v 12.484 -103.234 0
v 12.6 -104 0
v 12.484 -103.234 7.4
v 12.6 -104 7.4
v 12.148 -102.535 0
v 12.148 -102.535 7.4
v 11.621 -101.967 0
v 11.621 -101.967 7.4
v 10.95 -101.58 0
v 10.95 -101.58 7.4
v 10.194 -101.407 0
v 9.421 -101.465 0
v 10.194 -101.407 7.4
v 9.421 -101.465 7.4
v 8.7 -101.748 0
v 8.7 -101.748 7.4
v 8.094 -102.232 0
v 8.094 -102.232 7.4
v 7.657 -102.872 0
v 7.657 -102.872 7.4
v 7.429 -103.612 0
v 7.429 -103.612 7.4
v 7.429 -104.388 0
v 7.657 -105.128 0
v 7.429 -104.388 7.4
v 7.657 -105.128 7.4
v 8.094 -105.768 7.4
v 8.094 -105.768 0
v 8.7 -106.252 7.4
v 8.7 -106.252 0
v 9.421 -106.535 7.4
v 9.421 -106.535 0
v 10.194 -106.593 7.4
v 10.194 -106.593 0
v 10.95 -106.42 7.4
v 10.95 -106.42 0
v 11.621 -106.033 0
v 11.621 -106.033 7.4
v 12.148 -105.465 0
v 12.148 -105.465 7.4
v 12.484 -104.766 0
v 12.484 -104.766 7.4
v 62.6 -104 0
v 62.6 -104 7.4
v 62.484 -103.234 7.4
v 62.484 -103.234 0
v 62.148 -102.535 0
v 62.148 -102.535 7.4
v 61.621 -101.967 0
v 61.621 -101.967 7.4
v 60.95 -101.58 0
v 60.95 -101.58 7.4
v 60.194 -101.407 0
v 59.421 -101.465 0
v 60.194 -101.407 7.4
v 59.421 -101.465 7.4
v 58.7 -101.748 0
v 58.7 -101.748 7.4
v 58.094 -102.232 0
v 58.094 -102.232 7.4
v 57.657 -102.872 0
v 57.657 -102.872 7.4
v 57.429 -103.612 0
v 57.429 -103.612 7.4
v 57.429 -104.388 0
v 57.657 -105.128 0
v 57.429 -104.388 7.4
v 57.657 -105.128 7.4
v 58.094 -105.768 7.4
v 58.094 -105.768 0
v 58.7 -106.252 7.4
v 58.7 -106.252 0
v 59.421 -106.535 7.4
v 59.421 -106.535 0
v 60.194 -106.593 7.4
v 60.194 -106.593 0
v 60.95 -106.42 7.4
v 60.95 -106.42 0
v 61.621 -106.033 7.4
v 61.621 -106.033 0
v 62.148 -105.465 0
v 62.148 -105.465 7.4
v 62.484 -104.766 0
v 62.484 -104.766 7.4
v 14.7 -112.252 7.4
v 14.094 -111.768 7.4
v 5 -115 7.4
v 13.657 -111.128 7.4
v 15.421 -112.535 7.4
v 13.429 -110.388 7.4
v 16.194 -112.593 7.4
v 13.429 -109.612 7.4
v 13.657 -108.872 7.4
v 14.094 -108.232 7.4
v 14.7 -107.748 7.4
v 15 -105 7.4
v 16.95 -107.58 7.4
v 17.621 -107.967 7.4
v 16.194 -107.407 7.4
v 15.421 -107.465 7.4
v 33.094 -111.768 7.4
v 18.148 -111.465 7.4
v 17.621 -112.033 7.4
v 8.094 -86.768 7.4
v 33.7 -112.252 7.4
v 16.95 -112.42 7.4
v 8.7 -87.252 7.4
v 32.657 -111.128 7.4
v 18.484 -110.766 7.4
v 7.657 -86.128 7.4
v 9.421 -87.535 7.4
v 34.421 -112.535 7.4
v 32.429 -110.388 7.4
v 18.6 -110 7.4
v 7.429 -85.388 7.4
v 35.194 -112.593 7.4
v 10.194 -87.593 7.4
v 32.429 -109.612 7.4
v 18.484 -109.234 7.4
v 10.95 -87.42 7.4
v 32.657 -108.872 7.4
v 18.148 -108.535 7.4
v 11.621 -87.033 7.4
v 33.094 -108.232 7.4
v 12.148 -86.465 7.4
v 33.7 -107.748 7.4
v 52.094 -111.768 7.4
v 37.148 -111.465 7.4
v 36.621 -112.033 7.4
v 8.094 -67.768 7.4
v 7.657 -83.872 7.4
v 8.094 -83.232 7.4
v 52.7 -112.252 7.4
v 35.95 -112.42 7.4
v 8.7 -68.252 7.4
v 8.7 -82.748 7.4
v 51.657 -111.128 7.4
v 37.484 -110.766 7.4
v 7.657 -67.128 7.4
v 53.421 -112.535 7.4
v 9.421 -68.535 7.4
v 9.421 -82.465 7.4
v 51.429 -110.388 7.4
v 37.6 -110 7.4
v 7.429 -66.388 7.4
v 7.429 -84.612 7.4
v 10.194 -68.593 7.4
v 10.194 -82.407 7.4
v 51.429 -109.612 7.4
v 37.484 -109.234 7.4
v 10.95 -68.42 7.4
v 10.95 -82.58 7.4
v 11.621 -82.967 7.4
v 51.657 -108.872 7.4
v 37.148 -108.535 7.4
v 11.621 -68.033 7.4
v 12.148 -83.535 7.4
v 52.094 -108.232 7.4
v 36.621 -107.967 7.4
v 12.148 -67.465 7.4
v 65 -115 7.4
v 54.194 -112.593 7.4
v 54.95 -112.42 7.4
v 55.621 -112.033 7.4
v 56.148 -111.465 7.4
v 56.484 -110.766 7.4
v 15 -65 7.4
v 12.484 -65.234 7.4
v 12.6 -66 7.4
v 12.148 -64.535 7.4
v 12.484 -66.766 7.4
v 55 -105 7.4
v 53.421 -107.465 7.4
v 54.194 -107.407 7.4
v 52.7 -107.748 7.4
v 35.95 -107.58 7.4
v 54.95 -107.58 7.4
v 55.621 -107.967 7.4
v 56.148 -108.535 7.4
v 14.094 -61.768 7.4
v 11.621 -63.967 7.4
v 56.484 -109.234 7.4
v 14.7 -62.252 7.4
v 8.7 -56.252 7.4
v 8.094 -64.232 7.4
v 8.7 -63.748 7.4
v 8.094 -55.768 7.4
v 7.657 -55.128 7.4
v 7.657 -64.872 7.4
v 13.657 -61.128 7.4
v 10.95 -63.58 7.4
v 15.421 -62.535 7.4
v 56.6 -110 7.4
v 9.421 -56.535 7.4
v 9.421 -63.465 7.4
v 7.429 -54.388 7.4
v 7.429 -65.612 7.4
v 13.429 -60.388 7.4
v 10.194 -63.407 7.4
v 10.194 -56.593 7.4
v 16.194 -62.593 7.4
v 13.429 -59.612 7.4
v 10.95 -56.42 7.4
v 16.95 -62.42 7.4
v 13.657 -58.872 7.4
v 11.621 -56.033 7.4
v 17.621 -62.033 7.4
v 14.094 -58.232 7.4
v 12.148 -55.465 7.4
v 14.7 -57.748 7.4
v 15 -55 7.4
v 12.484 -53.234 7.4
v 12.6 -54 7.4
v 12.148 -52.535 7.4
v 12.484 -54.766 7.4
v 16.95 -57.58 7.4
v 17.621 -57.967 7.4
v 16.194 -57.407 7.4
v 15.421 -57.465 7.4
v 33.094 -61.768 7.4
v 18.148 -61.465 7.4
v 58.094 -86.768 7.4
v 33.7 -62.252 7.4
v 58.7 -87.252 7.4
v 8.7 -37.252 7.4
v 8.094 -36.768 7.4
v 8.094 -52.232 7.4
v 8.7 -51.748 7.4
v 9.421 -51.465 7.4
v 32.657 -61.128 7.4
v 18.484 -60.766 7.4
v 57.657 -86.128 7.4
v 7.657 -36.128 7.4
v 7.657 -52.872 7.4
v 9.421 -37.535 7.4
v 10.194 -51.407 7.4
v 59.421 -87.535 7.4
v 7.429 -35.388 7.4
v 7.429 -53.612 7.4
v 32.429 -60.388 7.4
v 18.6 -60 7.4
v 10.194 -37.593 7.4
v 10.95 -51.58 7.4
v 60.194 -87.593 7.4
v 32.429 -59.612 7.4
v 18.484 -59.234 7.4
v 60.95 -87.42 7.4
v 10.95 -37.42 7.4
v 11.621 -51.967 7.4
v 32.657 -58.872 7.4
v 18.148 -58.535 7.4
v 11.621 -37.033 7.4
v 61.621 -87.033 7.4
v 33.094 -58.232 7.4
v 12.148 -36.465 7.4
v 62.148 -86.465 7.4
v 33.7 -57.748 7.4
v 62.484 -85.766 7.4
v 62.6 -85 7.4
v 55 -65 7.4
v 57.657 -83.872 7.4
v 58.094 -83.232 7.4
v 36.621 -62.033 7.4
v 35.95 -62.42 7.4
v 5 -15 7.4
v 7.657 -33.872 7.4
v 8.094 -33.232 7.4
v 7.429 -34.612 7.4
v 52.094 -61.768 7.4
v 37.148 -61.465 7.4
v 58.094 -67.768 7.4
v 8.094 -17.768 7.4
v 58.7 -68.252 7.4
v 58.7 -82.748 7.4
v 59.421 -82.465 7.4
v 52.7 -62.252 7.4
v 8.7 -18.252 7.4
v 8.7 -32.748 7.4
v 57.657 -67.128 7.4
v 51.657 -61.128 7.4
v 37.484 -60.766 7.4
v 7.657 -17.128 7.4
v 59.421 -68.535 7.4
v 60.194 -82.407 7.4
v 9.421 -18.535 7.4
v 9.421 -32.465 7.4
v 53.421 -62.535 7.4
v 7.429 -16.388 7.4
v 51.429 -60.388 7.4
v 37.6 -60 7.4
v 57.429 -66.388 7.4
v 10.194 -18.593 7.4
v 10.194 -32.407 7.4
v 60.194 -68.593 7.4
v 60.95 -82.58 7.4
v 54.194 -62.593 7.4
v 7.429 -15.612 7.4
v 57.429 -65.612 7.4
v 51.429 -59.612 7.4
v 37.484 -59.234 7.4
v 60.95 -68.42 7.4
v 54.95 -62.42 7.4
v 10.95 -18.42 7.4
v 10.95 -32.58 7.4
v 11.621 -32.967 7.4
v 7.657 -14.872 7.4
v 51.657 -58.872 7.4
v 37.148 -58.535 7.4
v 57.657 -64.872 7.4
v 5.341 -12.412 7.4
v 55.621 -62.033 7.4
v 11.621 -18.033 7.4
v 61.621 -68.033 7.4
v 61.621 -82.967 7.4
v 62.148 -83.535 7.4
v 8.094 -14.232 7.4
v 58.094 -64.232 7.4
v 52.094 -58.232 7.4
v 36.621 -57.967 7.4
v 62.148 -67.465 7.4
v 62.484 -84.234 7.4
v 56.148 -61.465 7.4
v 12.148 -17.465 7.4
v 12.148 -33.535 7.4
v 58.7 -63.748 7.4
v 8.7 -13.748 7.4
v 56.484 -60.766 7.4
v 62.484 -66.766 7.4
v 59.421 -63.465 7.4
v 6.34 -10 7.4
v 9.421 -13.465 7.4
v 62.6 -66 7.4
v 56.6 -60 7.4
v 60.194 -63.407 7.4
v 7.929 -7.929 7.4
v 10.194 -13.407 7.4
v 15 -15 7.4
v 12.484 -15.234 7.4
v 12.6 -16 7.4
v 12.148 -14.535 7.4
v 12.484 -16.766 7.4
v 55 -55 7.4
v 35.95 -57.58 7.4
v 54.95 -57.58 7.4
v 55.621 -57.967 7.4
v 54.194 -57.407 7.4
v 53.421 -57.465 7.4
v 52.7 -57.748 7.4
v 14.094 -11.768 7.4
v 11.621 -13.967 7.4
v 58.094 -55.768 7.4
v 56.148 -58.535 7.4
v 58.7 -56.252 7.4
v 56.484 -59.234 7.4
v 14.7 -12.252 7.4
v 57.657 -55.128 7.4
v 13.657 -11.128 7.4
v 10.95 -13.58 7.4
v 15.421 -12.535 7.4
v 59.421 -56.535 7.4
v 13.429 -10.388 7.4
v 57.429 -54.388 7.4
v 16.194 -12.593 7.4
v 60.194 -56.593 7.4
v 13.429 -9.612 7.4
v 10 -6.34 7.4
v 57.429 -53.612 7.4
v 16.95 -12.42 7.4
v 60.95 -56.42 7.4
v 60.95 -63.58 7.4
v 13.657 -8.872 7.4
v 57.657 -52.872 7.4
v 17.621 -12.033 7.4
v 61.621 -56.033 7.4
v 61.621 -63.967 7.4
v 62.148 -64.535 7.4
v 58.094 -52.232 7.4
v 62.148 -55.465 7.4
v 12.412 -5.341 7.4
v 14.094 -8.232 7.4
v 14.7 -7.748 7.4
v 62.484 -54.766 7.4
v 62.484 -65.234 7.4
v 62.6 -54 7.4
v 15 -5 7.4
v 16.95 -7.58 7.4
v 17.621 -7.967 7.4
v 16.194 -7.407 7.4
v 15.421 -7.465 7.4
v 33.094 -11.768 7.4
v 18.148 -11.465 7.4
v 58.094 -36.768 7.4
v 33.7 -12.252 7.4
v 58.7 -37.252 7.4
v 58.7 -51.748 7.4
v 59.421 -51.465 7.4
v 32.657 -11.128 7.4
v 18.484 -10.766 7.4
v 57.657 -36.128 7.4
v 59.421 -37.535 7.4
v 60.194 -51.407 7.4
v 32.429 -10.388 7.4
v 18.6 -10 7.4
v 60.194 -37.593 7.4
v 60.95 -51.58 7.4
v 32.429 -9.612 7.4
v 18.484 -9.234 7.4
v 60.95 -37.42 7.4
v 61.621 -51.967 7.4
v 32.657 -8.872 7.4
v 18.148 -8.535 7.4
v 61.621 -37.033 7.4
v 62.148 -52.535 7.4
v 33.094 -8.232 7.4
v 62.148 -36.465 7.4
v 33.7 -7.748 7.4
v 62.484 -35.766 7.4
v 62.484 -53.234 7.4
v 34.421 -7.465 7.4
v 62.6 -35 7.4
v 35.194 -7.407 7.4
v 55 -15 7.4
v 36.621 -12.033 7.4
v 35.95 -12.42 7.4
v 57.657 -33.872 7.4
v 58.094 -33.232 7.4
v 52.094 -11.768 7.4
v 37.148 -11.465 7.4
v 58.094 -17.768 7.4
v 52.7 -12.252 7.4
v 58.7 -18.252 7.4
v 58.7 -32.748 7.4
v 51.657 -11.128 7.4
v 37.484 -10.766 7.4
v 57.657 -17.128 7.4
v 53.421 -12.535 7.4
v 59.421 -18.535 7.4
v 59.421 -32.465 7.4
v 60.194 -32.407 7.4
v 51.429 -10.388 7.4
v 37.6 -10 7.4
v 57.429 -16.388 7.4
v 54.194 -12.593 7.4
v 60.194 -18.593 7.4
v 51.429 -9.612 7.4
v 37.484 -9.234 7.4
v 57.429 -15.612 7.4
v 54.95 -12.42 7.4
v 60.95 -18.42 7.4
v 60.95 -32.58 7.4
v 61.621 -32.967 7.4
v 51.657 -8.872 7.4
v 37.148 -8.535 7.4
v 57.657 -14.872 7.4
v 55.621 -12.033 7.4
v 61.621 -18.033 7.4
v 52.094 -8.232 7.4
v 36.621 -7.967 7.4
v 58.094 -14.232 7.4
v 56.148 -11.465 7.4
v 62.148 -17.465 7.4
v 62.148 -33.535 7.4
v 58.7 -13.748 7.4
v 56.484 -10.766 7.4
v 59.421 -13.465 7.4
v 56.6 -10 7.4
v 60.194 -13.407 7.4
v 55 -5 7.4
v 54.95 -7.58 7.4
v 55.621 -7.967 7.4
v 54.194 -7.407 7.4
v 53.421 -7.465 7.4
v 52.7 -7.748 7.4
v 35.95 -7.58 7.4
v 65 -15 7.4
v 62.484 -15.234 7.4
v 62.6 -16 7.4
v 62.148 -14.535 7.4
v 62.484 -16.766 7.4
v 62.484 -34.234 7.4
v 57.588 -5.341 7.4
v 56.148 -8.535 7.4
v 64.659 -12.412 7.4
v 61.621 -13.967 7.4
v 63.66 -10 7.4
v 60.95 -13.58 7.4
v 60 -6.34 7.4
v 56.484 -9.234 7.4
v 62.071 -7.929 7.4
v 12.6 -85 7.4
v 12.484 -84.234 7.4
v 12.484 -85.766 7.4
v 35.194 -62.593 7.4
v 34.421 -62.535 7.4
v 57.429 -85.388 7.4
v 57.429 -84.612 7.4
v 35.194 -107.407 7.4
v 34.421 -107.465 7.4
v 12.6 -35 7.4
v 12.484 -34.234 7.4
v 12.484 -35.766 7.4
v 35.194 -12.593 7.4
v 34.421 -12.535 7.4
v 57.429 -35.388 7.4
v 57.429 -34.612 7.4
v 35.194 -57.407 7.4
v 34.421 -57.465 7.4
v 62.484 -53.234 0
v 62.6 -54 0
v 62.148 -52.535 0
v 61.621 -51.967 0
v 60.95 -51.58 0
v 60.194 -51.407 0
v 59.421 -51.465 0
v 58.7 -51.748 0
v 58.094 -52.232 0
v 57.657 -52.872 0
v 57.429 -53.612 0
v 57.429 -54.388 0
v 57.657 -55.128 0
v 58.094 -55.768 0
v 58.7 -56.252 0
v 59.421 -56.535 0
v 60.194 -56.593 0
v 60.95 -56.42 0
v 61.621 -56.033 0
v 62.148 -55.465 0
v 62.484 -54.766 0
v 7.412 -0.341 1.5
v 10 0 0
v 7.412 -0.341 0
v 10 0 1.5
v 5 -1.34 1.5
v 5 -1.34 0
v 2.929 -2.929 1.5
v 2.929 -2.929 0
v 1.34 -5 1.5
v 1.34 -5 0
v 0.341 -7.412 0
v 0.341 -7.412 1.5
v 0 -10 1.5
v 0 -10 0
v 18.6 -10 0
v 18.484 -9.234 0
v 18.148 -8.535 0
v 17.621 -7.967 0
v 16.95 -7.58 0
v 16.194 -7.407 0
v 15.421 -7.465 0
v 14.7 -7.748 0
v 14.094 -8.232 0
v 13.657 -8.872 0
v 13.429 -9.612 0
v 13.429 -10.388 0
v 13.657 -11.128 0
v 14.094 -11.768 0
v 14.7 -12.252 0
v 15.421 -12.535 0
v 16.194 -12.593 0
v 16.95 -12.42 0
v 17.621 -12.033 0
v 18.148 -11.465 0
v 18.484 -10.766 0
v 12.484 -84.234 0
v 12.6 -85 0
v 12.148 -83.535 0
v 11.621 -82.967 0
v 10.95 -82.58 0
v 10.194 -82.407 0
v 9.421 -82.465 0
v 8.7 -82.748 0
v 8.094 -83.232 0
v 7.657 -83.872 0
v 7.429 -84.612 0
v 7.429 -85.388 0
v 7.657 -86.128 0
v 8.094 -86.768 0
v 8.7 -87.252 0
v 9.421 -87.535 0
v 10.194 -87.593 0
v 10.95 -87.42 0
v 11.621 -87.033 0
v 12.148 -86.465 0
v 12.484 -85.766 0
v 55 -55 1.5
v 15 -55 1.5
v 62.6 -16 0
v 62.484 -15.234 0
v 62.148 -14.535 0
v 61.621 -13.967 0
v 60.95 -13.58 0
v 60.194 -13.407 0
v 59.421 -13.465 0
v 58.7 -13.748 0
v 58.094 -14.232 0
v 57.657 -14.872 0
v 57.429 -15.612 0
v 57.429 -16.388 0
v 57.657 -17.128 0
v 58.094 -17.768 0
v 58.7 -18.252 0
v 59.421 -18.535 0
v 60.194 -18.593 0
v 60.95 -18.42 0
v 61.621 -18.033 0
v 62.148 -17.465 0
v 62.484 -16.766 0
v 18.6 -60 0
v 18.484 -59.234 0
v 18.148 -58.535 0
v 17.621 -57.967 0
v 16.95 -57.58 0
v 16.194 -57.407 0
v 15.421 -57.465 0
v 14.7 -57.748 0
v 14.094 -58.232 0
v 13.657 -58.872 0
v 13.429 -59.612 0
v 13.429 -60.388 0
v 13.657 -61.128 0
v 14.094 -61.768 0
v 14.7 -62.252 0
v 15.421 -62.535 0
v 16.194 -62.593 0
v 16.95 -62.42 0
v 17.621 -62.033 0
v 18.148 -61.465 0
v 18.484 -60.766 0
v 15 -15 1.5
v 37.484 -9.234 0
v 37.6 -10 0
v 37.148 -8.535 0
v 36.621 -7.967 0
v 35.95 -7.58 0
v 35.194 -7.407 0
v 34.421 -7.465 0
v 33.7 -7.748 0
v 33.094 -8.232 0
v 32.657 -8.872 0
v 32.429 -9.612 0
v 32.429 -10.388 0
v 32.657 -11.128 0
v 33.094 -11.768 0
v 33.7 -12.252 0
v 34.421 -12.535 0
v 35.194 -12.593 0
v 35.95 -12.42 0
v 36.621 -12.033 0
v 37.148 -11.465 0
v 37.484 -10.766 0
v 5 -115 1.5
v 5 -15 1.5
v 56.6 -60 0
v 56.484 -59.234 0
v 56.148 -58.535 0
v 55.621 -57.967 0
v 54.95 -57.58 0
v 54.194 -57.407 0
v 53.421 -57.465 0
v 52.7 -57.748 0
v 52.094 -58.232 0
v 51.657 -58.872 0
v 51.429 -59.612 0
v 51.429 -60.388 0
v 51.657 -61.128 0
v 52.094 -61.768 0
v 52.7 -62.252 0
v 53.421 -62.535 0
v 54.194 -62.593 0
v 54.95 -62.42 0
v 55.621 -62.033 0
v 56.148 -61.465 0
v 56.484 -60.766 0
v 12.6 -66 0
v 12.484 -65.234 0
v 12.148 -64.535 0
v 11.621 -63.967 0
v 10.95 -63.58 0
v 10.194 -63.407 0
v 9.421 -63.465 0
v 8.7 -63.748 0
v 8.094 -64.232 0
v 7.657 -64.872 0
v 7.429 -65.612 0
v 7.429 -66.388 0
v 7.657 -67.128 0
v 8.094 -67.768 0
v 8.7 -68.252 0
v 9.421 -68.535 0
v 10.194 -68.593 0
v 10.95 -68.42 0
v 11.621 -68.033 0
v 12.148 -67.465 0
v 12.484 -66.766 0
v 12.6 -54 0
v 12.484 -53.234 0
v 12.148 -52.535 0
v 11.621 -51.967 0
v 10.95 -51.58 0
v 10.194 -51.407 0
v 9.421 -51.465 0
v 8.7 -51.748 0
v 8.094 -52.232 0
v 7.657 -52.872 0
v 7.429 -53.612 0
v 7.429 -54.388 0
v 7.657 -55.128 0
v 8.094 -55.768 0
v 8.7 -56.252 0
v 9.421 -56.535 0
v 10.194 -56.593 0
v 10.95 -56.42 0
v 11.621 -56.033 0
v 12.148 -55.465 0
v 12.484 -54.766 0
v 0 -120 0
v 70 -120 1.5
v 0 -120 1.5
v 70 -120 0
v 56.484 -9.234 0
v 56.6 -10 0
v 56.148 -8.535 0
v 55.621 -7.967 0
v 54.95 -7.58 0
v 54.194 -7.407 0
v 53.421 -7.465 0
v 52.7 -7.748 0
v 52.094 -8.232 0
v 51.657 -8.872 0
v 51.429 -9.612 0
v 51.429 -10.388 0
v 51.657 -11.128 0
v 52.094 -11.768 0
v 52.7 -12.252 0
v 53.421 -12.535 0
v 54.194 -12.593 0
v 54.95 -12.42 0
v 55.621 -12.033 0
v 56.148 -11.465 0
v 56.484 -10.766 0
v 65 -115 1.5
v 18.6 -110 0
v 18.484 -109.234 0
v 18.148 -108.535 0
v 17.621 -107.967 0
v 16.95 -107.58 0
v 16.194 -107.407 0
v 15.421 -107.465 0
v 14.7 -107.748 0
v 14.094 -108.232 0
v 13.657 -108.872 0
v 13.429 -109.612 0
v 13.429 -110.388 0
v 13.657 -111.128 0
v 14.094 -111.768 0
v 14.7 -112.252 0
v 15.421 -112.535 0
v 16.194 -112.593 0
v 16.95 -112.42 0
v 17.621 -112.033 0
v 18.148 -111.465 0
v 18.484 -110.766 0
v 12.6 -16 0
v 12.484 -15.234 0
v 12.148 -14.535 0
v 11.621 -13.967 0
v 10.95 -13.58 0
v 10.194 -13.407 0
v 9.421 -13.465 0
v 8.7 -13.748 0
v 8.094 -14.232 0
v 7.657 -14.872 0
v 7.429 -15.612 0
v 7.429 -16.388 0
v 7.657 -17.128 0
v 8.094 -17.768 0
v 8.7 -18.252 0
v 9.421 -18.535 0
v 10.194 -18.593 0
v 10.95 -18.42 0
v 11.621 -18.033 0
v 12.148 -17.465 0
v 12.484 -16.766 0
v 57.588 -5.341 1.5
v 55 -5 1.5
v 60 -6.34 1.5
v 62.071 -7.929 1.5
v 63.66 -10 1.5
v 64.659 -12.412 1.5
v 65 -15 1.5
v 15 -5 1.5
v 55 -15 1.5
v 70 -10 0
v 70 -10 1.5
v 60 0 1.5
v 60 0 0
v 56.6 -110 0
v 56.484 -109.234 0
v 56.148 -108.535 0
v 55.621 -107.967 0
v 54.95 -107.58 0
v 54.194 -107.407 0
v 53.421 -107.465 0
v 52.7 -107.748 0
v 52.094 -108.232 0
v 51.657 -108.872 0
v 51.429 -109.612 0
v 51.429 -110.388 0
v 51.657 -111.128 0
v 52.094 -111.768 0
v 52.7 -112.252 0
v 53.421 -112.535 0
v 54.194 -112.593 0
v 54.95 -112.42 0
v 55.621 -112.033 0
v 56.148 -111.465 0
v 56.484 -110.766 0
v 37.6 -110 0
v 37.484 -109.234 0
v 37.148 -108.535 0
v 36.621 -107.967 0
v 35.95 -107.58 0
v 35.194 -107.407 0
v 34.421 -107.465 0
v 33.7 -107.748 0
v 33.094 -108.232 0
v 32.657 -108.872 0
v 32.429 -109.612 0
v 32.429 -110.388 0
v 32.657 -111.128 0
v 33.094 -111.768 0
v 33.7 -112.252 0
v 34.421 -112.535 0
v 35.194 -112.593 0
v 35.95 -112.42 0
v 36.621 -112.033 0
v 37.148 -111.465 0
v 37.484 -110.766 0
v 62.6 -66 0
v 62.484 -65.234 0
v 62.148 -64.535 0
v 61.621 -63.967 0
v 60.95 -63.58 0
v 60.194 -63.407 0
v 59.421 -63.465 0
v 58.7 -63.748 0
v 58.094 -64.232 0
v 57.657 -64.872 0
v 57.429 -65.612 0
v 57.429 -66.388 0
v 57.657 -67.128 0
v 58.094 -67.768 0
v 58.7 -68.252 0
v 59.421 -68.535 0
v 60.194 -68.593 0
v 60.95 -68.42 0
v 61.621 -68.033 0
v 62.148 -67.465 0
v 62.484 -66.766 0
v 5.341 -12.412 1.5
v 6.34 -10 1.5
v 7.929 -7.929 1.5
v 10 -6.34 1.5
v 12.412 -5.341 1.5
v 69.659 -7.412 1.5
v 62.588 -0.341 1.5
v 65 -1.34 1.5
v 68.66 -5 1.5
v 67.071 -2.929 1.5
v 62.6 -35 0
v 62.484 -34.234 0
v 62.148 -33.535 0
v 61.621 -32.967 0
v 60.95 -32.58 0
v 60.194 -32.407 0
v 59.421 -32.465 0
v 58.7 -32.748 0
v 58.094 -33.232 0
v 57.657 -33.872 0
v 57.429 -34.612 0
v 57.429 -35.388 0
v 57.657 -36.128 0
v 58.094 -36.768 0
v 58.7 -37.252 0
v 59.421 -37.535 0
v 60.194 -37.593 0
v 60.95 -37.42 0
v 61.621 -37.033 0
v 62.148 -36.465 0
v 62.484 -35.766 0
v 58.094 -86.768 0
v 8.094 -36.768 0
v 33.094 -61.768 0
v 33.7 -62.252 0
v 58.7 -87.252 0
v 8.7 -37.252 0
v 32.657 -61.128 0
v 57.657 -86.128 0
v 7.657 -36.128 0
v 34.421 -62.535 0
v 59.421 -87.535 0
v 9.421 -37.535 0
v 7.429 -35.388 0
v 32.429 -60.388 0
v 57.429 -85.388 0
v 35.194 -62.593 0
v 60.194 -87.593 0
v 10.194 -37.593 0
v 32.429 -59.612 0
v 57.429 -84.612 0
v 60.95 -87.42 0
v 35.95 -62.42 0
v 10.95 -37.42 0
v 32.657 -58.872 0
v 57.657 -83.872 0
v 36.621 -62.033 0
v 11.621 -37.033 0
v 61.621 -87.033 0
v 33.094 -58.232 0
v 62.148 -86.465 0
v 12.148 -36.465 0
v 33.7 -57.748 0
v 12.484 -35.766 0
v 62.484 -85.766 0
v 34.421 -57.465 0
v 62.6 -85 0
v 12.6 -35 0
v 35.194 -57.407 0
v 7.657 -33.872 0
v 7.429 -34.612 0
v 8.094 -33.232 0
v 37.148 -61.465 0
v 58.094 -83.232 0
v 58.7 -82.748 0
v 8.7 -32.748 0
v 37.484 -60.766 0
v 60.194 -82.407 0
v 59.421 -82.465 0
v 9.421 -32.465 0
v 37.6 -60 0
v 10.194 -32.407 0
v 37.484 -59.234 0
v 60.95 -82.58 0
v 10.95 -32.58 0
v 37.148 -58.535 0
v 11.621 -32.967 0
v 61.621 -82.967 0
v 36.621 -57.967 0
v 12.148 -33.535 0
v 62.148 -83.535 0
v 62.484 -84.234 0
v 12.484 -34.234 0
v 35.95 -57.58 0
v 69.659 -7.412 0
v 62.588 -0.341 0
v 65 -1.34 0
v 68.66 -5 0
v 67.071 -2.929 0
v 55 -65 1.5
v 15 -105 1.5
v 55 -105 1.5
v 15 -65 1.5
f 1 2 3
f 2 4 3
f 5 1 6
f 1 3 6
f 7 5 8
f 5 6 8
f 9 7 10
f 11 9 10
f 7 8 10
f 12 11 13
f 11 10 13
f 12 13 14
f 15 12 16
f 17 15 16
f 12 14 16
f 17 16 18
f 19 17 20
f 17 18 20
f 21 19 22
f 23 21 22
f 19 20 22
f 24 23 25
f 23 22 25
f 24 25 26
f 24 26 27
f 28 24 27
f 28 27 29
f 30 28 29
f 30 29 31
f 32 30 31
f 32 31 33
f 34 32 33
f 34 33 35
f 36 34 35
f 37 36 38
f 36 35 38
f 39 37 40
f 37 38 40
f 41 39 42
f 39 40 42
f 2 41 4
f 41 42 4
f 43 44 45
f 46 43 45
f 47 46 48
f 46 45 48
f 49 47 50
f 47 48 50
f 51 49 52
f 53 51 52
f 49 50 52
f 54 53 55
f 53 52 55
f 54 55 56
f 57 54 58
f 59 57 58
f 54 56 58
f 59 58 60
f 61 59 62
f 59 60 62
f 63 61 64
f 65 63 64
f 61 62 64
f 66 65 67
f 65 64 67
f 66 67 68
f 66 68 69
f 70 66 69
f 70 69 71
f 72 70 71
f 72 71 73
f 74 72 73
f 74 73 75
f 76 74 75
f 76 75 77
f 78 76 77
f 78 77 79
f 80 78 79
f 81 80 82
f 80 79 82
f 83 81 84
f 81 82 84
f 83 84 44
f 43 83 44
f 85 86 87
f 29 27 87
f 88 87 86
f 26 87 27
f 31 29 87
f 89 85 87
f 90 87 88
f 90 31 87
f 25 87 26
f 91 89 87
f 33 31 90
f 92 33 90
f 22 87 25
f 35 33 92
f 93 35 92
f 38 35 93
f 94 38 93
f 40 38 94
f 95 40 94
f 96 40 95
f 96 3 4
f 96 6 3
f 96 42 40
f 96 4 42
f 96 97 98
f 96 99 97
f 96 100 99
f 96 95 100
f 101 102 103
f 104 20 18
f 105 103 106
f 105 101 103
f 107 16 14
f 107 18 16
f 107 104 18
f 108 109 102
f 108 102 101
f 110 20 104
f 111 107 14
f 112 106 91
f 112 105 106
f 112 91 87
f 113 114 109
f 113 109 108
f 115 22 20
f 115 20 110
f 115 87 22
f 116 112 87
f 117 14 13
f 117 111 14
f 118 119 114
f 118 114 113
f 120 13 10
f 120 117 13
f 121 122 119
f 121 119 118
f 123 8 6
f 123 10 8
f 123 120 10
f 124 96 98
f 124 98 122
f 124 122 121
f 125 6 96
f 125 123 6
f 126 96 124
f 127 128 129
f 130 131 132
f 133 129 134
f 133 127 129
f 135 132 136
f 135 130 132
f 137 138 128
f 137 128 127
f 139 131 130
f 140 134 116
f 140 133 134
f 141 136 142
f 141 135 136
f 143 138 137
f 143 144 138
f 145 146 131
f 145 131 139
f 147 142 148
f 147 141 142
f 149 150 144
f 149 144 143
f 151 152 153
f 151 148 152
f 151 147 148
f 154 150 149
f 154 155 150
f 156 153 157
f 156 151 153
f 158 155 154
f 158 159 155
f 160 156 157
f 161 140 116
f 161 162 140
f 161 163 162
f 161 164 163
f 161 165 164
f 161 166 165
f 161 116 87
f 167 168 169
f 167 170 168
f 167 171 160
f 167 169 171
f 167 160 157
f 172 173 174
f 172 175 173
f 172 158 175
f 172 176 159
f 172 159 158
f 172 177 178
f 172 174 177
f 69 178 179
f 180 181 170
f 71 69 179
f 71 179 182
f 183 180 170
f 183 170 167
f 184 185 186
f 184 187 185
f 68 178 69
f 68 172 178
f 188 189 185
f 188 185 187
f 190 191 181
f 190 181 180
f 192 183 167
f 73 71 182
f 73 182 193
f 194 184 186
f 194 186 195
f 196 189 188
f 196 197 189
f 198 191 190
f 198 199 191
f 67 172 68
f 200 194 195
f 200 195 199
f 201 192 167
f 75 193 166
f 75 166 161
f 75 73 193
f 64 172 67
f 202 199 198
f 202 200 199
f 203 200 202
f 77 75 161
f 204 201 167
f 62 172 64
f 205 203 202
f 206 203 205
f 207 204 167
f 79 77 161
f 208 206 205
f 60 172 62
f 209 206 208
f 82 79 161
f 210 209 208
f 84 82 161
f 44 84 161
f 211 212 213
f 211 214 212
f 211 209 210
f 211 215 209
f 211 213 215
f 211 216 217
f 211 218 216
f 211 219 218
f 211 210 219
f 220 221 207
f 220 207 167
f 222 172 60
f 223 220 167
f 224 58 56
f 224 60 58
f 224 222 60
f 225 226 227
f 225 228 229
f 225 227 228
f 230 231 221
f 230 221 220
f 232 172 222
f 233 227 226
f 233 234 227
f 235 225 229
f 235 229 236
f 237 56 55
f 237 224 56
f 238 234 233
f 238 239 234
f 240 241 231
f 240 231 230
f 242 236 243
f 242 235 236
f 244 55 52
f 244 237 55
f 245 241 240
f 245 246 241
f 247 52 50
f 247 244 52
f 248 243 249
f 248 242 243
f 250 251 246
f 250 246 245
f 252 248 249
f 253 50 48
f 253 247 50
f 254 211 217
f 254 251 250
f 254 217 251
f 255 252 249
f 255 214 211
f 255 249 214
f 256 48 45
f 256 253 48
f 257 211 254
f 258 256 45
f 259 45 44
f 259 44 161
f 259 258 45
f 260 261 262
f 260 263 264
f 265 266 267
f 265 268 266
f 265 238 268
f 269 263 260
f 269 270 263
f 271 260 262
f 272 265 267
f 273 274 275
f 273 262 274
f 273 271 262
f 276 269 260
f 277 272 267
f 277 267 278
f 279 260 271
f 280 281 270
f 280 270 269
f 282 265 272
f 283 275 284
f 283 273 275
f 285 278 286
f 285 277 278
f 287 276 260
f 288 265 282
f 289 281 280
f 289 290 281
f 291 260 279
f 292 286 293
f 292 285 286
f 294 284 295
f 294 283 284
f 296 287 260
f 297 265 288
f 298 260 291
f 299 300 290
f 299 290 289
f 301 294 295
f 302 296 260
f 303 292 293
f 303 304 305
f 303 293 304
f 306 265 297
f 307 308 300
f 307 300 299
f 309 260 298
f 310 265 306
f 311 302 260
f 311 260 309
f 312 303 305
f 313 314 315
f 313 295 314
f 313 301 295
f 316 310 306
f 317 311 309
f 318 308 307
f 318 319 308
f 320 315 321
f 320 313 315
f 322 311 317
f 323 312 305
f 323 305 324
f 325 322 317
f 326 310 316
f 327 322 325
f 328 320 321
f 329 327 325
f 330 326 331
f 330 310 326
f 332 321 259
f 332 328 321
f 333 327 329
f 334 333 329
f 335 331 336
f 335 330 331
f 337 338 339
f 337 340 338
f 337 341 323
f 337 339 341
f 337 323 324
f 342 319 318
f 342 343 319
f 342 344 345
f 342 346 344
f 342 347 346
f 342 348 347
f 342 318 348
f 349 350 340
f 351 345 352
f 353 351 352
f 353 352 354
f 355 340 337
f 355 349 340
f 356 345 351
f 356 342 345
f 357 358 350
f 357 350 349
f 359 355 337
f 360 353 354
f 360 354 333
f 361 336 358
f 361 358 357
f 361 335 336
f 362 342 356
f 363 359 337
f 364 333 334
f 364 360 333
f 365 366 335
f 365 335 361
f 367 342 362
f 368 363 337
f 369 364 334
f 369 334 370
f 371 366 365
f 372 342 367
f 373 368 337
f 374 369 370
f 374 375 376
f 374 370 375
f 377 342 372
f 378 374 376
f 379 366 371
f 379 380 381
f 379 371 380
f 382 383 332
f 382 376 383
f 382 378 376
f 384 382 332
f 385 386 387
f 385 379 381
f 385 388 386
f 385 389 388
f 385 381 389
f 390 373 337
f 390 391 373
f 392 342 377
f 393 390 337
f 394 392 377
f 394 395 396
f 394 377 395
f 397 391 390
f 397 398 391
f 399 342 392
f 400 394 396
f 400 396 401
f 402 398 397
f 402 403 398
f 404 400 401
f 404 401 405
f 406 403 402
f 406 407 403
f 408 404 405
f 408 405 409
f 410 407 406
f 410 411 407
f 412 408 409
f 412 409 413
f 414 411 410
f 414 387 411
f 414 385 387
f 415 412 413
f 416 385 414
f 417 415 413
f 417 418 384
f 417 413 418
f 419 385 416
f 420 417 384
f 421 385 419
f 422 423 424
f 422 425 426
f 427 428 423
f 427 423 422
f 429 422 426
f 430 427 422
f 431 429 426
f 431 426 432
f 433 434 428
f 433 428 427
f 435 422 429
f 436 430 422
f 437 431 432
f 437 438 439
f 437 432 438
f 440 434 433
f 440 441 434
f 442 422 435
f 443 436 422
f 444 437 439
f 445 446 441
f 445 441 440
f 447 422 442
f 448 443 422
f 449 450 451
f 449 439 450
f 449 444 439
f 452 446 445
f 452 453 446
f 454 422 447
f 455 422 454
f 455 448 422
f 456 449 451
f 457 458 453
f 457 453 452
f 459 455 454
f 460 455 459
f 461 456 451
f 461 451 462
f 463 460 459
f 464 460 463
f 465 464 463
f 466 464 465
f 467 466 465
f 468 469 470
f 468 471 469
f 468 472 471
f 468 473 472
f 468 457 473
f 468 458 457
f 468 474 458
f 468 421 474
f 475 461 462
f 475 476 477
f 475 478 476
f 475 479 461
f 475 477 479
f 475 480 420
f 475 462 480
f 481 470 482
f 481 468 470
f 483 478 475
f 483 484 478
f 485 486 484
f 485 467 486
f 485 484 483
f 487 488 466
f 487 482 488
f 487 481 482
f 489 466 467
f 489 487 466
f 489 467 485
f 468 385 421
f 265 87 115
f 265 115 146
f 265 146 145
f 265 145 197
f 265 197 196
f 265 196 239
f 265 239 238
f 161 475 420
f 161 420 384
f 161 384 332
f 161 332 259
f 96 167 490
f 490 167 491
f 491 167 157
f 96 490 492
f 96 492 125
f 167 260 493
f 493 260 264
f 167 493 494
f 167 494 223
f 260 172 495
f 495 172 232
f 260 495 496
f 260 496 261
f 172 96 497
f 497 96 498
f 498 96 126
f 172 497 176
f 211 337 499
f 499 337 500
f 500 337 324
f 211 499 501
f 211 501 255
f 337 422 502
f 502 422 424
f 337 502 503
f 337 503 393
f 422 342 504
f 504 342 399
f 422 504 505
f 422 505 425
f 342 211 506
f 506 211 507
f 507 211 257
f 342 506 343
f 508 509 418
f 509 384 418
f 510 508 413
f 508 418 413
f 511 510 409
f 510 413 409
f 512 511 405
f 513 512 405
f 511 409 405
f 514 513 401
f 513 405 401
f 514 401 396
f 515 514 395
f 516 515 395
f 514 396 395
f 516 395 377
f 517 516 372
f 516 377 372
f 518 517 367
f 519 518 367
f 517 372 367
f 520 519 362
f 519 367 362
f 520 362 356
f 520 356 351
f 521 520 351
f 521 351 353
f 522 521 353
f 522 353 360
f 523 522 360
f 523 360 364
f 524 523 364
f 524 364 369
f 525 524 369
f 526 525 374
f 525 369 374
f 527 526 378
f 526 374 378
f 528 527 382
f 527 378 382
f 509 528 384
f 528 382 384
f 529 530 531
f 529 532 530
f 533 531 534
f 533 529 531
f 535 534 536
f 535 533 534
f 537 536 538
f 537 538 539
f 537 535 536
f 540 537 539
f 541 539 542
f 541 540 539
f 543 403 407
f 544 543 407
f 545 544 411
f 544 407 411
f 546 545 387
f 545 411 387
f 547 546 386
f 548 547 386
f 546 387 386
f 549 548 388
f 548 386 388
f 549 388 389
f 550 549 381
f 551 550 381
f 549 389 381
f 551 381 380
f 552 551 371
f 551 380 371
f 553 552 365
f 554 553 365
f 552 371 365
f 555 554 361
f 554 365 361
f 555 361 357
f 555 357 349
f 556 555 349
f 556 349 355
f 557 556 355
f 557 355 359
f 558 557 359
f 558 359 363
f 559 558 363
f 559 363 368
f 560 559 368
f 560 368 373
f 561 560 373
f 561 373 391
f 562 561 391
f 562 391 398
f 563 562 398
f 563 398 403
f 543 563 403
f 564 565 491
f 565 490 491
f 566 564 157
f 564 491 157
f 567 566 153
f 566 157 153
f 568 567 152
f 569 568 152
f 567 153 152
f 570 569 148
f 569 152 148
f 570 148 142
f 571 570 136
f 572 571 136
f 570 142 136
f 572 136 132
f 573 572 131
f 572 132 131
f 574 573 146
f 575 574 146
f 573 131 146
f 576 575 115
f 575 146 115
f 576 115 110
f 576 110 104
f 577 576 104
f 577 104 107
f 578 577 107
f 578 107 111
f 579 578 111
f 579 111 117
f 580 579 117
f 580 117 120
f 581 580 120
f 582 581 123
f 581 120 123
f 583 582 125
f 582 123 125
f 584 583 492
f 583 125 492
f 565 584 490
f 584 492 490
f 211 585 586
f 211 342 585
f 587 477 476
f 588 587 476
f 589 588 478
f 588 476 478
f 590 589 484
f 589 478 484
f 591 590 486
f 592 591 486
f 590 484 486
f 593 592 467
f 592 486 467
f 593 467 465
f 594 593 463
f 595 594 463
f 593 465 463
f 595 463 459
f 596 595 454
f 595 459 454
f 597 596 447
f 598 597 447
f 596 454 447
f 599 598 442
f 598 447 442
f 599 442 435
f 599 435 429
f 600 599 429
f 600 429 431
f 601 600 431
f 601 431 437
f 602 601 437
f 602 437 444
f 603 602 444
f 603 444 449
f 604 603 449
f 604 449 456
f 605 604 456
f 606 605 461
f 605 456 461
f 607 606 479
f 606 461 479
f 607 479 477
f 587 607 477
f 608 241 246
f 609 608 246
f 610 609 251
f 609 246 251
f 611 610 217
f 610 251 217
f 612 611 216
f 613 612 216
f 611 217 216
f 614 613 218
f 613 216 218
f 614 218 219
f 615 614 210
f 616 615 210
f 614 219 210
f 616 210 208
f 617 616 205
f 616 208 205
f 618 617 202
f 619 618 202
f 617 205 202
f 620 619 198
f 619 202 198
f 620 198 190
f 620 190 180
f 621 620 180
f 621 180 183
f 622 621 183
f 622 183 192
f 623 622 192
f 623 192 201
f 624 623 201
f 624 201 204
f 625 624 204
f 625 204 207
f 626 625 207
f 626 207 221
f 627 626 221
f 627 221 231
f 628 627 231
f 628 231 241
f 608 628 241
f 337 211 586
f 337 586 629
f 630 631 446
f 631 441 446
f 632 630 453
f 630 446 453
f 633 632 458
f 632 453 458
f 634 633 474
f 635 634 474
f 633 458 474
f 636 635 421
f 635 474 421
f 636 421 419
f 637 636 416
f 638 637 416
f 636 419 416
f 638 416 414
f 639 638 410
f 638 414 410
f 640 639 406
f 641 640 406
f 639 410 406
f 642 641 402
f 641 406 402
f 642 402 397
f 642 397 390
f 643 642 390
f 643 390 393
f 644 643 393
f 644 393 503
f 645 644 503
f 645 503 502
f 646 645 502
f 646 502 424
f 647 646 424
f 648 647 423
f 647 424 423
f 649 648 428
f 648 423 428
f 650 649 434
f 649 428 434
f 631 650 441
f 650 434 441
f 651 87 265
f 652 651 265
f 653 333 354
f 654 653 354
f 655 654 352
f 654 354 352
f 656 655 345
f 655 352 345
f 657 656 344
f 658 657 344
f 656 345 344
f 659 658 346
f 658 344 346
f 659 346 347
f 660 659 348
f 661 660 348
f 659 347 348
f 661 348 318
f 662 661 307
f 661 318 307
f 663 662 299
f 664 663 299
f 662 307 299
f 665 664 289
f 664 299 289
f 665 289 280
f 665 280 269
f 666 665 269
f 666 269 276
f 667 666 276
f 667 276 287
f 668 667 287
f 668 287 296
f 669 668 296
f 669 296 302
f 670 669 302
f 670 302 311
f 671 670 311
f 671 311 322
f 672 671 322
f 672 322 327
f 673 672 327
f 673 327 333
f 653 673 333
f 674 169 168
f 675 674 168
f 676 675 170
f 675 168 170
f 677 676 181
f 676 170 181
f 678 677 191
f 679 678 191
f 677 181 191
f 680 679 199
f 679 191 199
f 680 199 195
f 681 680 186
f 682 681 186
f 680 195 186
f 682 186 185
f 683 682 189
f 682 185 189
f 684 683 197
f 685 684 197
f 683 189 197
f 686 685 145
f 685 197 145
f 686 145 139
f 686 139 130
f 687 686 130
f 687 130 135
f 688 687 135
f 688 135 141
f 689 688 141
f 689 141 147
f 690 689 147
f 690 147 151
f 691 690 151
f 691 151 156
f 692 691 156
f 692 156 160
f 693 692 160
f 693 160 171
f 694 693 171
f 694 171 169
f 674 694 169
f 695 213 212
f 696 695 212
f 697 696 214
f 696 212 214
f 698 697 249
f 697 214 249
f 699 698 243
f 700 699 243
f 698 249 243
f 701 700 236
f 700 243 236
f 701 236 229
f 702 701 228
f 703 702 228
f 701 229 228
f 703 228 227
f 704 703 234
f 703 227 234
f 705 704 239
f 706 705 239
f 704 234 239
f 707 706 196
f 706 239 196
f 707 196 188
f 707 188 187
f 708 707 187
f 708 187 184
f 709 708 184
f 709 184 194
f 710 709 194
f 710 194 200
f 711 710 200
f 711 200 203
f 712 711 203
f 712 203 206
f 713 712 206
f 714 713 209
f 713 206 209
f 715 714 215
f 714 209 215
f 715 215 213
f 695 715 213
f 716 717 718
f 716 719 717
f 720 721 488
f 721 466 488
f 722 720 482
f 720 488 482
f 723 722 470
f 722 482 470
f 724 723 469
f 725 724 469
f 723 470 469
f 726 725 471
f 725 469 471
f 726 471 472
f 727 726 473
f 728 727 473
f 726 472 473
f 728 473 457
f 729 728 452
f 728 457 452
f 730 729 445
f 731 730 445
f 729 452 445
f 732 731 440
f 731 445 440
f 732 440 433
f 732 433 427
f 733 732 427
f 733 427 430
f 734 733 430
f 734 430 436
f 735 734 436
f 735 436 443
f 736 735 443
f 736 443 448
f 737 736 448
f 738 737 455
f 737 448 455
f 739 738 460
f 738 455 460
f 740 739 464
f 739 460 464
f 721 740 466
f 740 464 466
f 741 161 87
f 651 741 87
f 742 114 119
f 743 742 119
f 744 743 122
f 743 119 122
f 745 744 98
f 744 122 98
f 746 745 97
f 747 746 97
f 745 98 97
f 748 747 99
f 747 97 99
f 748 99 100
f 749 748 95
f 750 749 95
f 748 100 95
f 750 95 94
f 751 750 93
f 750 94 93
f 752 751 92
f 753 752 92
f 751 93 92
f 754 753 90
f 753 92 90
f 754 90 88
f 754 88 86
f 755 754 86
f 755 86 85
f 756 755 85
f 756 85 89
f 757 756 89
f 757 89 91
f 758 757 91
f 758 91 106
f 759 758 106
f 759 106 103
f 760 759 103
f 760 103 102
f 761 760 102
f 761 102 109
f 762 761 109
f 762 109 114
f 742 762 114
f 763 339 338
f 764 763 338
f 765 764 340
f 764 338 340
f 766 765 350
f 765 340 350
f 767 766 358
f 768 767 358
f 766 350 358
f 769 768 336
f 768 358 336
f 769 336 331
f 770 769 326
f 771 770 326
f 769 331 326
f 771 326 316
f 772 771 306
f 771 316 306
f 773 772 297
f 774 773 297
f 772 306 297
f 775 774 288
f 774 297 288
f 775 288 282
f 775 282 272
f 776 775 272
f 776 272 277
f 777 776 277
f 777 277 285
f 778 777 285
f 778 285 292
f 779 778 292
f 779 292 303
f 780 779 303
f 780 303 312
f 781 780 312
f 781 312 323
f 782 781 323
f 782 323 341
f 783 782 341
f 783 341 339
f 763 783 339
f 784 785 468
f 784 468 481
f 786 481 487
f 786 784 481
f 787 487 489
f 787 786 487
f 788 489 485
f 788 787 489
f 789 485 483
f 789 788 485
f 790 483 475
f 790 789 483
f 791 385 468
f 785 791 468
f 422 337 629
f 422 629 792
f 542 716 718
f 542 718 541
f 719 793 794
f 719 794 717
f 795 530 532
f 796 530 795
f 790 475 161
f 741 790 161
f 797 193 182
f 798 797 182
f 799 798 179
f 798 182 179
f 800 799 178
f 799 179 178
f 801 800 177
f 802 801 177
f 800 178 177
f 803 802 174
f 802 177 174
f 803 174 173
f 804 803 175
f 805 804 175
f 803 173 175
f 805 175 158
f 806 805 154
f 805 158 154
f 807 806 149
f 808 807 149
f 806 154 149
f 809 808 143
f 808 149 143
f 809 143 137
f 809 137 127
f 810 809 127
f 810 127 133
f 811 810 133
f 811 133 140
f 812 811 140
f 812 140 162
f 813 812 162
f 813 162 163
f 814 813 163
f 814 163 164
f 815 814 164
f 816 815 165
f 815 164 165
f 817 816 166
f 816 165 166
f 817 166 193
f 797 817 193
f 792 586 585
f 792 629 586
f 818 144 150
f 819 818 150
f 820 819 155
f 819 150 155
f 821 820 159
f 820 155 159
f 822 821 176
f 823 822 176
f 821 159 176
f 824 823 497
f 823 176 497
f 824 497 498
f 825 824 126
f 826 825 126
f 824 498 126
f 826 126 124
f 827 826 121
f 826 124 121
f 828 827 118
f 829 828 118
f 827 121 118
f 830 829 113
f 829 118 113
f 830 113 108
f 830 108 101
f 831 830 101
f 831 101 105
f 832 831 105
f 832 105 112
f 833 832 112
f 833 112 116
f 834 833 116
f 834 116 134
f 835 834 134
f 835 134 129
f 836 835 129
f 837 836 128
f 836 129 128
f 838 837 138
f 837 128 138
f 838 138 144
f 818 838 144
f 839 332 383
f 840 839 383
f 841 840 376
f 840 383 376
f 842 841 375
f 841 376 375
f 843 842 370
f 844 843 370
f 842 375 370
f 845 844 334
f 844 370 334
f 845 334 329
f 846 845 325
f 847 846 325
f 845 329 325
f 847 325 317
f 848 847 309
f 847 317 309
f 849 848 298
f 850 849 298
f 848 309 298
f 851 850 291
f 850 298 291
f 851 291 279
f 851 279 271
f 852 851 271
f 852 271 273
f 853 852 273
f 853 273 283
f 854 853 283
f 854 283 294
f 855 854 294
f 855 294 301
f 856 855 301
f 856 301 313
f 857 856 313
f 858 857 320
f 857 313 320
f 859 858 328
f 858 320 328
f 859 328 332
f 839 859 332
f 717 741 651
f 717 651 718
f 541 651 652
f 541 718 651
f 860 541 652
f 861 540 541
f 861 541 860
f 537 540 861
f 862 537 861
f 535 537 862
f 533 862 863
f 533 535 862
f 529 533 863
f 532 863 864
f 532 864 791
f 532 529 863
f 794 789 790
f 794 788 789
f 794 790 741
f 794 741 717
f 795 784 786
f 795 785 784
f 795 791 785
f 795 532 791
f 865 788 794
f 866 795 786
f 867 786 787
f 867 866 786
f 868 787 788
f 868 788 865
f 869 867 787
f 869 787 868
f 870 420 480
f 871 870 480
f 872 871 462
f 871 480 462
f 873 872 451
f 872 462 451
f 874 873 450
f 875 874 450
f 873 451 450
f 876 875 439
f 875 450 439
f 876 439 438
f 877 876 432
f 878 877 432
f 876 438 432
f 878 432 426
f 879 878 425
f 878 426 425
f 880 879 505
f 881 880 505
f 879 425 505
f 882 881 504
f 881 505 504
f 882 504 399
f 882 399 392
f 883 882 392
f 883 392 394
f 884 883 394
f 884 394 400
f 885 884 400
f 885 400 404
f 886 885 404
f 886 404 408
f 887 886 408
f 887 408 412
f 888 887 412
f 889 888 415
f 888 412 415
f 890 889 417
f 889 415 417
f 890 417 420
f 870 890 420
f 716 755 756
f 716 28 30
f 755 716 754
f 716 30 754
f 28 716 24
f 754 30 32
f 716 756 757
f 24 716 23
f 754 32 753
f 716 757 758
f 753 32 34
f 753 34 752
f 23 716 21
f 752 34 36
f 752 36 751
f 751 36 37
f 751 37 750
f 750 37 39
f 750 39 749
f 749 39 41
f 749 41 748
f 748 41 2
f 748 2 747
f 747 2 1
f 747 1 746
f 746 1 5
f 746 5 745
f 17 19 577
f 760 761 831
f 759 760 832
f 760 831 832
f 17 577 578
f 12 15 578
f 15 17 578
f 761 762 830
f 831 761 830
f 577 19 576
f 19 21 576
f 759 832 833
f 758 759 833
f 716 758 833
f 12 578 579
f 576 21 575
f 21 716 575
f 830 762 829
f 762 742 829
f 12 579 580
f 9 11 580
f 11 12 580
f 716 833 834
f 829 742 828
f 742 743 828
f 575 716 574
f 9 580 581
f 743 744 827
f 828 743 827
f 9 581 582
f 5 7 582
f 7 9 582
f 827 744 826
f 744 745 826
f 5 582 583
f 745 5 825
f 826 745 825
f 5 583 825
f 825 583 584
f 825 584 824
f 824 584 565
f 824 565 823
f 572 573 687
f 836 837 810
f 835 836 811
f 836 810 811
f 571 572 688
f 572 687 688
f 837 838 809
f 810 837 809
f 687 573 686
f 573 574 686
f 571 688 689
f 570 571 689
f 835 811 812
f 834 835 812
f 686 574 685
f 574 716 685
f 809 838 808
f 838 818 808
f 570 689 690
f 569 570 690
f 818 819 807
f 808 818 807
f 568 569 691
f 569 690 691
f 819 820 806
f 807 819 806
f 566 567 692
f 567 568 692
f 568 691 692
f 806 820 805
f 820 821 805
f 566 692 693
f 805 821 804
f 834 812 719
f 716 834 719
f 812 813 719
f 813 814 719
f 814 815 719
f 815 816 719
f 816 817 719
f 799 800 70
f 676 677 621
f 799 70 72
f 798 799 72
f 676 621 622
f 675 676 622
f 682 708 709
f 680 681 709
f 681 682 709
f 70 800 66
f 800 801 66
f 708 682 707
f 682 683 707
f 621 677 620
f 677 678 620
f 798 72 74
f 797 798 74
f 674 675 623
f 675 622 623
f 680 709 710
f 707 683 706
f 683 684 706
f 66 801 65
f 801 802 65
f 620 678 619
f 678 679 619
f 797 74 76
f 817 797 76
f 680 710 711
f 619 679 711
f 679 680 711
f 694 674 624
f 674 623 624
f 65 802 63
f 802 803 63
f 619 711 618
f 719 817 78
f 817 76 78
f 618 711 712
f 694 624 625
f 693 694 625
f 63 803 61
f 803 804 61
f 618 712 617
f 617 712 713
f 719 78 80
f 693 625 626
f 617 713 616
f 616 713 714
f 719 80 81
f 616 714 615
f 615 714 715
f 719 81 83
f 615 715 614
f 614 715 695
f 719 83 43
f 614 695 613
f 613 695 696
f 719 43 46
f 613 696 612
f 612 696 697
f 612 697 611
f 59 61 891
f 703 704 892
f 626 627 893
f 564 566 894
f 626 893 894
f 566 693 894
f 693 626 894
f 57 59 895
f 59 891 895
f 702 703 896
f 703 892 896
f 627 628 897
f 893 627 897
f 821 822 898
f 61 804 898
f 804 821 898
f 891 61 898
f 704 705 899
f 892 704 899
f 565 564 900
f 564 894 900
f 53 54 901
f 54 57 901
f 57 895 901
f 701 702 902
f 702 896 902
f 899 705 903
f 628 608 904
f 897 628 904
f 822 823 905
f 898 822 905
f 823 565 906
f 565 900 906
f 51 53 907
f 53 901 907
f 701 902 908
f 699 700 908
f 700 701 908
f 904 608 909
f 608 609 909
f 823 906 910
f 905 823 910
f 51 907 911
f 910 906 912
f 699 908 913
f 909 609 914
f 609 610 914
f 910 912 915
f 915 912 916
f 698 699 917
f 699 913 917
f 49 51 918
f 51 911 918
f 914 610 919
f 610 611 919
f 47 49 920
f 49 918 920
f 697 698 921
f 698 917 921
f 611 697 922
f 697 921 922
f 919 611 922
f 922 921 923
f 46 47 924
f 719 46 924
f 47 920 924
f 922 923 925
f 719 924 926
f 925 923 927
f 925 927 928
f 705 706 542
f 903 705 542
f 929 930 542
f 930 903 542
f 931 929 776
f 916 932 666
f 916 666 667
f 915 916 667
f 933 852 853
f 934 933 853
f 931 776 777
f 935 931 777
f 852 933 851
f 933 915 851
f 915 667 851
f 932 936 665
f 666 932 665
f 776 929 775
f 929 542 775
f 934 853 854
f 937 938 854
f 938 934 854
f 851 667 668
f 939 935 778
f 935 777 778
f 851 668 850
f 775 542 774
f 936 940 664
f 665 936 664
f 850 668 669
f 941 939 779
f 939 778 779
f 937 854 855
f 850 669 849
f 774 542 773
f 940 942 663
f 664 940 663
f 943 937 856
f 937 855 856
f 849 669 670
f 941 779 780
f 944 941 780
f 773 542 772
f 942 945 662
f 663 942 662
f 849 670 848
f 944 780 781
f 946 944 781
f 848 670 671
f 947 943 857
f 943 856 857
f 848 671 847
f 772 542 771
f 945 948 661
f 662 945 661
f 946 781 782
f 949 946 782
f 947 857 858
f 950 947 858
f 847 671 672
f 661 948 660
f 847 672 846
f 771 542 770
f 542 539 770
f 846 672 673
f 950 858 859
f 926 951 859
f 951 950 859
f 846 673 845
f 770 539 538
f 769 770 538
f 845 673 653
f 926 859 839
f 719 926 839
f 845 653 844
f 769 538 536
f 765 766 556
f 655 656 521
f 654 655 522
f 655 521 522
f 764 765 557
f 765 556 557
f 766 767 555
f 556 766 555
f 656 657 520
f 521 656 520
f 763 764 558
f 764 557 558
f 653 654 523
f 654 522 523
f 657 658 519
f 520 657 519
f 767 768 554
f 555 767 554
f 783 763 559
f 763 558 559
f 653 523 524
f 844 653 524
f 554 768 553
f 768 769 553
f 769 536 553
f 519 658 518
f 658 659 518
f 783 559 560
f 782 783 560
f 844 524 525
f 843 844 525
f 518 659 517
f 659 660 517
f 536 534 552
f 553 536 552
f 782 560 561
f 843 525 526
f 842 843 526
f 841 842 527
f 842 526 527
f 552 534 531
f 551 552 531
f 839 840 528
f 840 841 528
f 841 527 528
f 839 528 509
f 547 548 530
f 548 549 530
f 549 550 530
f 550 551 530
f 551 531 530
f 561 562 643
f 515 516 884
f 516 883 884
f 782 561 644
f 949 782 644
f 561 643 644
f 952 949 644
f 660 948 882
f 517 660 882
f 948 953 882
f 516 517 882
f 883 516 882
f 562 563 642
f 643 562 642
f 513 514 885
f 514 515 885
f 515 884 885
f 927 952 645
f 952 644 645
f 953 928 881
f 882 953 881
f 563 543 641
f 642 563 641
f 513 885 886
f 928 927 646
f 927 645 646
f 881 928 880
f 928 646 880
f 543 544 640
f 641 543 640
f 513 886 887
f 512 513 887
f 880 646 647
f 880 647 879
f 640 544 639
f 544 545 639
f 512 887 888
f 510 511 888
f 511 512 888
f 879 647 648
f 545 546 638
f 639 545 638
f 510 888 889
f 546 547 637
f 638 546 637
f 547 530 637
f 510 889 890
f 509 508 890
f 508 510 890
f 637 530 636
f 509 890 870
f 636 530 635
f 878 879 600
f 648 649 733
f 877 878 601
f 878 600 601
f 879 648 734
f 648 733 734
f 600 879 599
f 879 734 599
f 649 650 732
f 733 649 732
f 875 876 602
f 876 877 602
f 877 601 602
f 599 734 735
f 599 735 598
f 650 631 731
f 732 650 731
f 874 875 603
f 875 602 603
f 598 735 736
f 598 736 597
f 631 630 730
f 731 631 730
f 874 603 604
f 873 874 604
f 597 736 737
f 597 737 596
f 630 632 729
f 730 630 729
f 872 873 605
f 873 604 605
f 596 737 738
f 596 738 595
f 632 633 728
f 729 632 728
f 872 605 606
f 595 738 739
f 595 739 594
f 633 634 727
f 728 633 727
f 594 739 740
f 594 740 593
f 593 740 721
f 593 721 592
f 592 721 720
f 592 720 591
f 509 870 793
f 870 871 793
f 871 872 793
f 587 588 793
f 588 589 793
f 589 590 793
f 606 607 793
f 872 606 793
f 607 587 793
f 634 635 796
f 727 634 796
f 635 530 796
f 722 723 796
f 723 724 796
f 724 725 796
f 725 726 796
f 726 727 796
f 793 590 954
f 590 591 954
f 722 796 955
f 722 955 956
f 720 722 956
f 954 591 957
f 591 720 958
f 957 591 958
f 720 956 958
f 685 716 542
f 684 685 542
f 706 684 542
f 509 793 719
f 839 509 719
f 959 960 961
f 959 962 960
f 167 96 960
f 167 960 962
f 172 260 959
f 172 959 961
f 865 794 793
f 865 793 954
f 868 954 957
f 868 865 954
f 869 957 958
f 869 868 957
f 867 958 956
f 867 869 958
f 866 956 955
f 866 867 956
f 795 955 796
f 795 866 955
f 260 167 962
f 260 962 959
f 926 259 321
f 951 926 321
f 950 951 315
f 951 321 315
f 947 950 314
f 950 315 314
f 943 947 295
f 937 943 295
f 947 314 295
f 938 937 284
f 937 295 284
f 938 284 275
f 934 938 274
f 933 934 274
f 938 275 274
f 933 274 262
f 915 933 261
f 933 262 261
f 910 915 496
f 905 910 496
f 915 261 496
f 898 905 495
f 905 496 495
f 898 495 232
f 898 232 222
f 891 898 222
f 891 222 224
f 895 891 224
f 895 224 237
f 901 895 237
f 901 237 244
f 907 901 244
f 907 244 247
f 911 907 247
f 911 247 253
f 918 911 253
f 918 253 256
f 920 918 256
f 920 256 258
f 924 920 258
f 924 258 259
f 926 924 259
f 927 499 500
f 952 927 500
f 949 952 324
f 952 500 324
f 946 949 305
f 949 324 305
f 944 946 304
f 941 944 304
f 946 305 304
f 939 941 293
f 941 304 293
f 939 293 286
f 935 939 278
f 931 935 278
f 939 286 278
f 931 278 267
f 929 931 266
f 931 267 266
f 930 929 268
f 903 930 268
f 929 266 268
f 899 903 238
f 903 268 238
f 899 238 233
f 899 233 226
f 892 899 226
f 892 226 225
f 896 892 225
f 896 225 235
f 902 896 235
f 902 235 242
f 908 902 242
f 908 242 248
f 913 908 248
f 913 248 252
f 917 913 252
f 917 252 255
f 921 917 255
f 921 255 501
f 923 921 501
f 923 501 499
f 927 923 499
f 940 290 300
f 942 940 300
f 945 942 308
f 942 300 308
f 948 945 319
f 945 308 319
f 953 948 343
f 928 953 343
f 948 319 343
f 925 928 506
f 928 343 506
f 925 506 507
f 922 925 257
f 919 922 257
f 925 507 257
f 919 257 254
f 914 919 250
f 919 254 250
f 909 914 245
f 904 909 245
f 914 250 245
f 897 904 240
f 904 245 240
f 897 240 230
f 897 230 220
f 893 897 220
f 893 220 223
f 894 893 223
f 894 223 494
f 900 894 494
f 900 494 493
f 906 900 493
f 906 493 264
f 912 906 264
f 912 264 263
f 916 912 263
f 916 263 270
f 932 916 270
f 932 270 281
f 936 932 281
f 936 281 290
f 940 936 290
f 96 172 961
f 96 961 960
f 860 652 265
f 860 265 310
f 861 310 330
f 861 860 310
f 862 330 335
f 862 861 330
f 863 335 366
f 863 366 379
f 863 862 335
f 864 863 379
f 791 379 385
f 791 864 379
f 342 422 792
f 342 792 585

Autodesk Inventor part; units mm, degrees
ref_plane "YZ Plane" through (0, 0, 0) normal (1, 0, 0) x (0, 1, 0)
ref_plane "XZ Plane" through (0, 0, 0) normal (0, 1, 0) x (-1, 0, 0)
ref_plane "XY Plane" through (0, 0, 0) normal (0, 0, 1) x (1, 0, 0)
sketch "Sketch1" plane through (0, 0, 0) normal (0, 0, 1) x (1, 0, 0)
  line L0 (0, 0) -> (70, 0)
  line L1 (70, 0) -> (70, -120)
  line L2 (70, -120) -> (0, -120)
  line L3 (0, -120) -> (0, 0)
  dimension "d0" = 70
  dimension "d1" = 120
extrude "Extrusion1" add sketch "Sketch1" along normal blind 7.4
sketch "Sketch2" plane through (0, 0, 7.4) normal (0, 0, 1) x (1, 0, 0)
  circle A0 centre (10, -104) radius 2.6
  circle A1 centre (16, -110) radius 2.6
  circle A2 centre (35, -110) radius 2.6
  circle A3 centre (10, -66) radius 2.6
  circle A4 centre (16, -60) radius 2.6
  circle A5 centre (10, -35) radius 2.6
  circle A6 centre (10, -16) radius 2.6
  circle A7 centre (16, -10) radius 2.6
  circle A8 centre (35, -60) radius 2.6
  circle A9 centre (60, -104) radius 2.6
  circle A10 centre (60, -66) radius 2.6
  circle A11 centre (10, -85) radius 2.6
  circle A12 centre (60, -85) radius 2.6
  circle A13 centre (54, -110) radius 2.6
  circle A14 centre (54, -60) radius 2.6
  circle A15 centre (60, -54) radius 2.6
  circle A16 centre (60, -16) radius 2.6
  circle A17 centre (10, -54) radius 2.6
  circle A18 centre (35, -10) radius 2.6
  circle A19 centre (54, -10) radius 2.6
  line L0 (0, 0) -> (0, -120) projected
  line L1 (70, -120) -> (70, 0) projected
  line L2 (70, 0) -> (0, 0) projected
  line L3 (0, -120) -> (70, -120) projected
  circle A20 centre (60, -35) radius 2.6
  dimension "d5" = 5.2
  dimension "d6" = 5.2
  dimension "d7" = 5.2
  dimension "d10" = 5.2
  dimension "d11" = 5.2
  dimension "d12" = 5.2
  dimension "d15" = 5.2
  dimension "d16" = 5.2
  dimension "d17" = 5.2
  dimension "d19" = 5.2
  dimension "d20" = 5.2
  dimension "d21" = 5.2
  dimension "d22" = 5.2
  dimension "d23" = 5.2
  dimension "d24" = 5.2
  dimension "d25" = 5.2
  dimension "d26" = 5.2
  dimension "d27" = 5.2
  dimension "d54" = 10
  dimension "d55" = 10
  dimension "d56" = 16
  dimension "d57" = 16
  dimension "d58" = 16
  dimension "d59" = 35
  dimension "d60" = 10
  dimension "d61" = 19
  dimension "d62" = 19
  dimension "d63" = 19
  dimension "d64" = 5.2
  dimension "d67" = 6
  dimension "d68" = 6
  dimension "d69" = 6
  dimension "d70" = 6
  dimension "d71" = 19
  dimension "d72" = 19
  dimension "d74" = 6
  dimension "d75" = 10
extrude "Extrusion2" cut sketch "Sketch2" against normal through all contours A0 | A1 | A2 | A3 | A4 | A5 | A6 | A7 | A8 | A9 | A10 | A11 | A12 | A13 | A14 | A15 | A16 | A17 | A18 | A19 | A20
sketch "Sketch3" plane through (0, 0, 7.4) normal (0, 0, 1) x (1, 0, 0)
  line L0 (15, -15) -> (55, -15)
  line L1 (55, -15) -> (55, -55)
  line L2 (55, -55) -> (15, -55)
  line L3 (15, -55) -> (15, -15)
  line L4 (15, -65) -> (55, -65)
  line L5 (55, -65) -> (55, -105)
  line L6 (55, -105) -> (15, -105)
  line L7 (15, -105) -> (15, -65)
  line L8 (0, 0) -> (0, -120) projected
  line L9 (70, 0) -> (0, 0) projected
  line L10 (0, -120) -> (70, -120) projected
  line L11 (70, -120) -> (70, 0) projected
  circle A0 centre (35, -10) radius 2.6 projected
  circle A1 centre (35, -60) radius 2.6 projected
  line L12 (5, -5) -> (65, -5)
  line L13 (65, -5) -> (65, -115)
  line L14 (65, -115) -> (5, -115)
  line L15 (5, -115) -> (5, -5)
  circle A2 centre (16, -10) radius 2.6 projected
  circle A3 centre (60, -16) radius 2.6 projected
  circle A4 centre (10, -35) radius 2.6 projected
  circle A5 centre (35, -110) radius 2.6 projected
  dimension "d47" = 15
  dimension "d48" = 15
  dimension "d76" = 15
  dimension "d77" = 15
  dimension "d78" = 15
  dimension "d80" = 5
  dimension "d81" = 5
  dimension "d82" = 5
  dimension "d83" = 5
  dimension "d84" = 5
  dimension "d85" = 5
extrude "Extrusion3" cut sketch "Sketch3" against normal blind 5.9 contours L0 L1 L2 L3 | L4 L5 L6 L7 | L9 L11 L10 L8
fillet "Fillet1" radius 10 2 edges at (70, 0, 0.75) (0, 0, 0.75)
fillet "Fillet2" radius 10 2 edges at (65, -5, 4.45) (5, -5, 4.45)
properties part number "edition 2"
